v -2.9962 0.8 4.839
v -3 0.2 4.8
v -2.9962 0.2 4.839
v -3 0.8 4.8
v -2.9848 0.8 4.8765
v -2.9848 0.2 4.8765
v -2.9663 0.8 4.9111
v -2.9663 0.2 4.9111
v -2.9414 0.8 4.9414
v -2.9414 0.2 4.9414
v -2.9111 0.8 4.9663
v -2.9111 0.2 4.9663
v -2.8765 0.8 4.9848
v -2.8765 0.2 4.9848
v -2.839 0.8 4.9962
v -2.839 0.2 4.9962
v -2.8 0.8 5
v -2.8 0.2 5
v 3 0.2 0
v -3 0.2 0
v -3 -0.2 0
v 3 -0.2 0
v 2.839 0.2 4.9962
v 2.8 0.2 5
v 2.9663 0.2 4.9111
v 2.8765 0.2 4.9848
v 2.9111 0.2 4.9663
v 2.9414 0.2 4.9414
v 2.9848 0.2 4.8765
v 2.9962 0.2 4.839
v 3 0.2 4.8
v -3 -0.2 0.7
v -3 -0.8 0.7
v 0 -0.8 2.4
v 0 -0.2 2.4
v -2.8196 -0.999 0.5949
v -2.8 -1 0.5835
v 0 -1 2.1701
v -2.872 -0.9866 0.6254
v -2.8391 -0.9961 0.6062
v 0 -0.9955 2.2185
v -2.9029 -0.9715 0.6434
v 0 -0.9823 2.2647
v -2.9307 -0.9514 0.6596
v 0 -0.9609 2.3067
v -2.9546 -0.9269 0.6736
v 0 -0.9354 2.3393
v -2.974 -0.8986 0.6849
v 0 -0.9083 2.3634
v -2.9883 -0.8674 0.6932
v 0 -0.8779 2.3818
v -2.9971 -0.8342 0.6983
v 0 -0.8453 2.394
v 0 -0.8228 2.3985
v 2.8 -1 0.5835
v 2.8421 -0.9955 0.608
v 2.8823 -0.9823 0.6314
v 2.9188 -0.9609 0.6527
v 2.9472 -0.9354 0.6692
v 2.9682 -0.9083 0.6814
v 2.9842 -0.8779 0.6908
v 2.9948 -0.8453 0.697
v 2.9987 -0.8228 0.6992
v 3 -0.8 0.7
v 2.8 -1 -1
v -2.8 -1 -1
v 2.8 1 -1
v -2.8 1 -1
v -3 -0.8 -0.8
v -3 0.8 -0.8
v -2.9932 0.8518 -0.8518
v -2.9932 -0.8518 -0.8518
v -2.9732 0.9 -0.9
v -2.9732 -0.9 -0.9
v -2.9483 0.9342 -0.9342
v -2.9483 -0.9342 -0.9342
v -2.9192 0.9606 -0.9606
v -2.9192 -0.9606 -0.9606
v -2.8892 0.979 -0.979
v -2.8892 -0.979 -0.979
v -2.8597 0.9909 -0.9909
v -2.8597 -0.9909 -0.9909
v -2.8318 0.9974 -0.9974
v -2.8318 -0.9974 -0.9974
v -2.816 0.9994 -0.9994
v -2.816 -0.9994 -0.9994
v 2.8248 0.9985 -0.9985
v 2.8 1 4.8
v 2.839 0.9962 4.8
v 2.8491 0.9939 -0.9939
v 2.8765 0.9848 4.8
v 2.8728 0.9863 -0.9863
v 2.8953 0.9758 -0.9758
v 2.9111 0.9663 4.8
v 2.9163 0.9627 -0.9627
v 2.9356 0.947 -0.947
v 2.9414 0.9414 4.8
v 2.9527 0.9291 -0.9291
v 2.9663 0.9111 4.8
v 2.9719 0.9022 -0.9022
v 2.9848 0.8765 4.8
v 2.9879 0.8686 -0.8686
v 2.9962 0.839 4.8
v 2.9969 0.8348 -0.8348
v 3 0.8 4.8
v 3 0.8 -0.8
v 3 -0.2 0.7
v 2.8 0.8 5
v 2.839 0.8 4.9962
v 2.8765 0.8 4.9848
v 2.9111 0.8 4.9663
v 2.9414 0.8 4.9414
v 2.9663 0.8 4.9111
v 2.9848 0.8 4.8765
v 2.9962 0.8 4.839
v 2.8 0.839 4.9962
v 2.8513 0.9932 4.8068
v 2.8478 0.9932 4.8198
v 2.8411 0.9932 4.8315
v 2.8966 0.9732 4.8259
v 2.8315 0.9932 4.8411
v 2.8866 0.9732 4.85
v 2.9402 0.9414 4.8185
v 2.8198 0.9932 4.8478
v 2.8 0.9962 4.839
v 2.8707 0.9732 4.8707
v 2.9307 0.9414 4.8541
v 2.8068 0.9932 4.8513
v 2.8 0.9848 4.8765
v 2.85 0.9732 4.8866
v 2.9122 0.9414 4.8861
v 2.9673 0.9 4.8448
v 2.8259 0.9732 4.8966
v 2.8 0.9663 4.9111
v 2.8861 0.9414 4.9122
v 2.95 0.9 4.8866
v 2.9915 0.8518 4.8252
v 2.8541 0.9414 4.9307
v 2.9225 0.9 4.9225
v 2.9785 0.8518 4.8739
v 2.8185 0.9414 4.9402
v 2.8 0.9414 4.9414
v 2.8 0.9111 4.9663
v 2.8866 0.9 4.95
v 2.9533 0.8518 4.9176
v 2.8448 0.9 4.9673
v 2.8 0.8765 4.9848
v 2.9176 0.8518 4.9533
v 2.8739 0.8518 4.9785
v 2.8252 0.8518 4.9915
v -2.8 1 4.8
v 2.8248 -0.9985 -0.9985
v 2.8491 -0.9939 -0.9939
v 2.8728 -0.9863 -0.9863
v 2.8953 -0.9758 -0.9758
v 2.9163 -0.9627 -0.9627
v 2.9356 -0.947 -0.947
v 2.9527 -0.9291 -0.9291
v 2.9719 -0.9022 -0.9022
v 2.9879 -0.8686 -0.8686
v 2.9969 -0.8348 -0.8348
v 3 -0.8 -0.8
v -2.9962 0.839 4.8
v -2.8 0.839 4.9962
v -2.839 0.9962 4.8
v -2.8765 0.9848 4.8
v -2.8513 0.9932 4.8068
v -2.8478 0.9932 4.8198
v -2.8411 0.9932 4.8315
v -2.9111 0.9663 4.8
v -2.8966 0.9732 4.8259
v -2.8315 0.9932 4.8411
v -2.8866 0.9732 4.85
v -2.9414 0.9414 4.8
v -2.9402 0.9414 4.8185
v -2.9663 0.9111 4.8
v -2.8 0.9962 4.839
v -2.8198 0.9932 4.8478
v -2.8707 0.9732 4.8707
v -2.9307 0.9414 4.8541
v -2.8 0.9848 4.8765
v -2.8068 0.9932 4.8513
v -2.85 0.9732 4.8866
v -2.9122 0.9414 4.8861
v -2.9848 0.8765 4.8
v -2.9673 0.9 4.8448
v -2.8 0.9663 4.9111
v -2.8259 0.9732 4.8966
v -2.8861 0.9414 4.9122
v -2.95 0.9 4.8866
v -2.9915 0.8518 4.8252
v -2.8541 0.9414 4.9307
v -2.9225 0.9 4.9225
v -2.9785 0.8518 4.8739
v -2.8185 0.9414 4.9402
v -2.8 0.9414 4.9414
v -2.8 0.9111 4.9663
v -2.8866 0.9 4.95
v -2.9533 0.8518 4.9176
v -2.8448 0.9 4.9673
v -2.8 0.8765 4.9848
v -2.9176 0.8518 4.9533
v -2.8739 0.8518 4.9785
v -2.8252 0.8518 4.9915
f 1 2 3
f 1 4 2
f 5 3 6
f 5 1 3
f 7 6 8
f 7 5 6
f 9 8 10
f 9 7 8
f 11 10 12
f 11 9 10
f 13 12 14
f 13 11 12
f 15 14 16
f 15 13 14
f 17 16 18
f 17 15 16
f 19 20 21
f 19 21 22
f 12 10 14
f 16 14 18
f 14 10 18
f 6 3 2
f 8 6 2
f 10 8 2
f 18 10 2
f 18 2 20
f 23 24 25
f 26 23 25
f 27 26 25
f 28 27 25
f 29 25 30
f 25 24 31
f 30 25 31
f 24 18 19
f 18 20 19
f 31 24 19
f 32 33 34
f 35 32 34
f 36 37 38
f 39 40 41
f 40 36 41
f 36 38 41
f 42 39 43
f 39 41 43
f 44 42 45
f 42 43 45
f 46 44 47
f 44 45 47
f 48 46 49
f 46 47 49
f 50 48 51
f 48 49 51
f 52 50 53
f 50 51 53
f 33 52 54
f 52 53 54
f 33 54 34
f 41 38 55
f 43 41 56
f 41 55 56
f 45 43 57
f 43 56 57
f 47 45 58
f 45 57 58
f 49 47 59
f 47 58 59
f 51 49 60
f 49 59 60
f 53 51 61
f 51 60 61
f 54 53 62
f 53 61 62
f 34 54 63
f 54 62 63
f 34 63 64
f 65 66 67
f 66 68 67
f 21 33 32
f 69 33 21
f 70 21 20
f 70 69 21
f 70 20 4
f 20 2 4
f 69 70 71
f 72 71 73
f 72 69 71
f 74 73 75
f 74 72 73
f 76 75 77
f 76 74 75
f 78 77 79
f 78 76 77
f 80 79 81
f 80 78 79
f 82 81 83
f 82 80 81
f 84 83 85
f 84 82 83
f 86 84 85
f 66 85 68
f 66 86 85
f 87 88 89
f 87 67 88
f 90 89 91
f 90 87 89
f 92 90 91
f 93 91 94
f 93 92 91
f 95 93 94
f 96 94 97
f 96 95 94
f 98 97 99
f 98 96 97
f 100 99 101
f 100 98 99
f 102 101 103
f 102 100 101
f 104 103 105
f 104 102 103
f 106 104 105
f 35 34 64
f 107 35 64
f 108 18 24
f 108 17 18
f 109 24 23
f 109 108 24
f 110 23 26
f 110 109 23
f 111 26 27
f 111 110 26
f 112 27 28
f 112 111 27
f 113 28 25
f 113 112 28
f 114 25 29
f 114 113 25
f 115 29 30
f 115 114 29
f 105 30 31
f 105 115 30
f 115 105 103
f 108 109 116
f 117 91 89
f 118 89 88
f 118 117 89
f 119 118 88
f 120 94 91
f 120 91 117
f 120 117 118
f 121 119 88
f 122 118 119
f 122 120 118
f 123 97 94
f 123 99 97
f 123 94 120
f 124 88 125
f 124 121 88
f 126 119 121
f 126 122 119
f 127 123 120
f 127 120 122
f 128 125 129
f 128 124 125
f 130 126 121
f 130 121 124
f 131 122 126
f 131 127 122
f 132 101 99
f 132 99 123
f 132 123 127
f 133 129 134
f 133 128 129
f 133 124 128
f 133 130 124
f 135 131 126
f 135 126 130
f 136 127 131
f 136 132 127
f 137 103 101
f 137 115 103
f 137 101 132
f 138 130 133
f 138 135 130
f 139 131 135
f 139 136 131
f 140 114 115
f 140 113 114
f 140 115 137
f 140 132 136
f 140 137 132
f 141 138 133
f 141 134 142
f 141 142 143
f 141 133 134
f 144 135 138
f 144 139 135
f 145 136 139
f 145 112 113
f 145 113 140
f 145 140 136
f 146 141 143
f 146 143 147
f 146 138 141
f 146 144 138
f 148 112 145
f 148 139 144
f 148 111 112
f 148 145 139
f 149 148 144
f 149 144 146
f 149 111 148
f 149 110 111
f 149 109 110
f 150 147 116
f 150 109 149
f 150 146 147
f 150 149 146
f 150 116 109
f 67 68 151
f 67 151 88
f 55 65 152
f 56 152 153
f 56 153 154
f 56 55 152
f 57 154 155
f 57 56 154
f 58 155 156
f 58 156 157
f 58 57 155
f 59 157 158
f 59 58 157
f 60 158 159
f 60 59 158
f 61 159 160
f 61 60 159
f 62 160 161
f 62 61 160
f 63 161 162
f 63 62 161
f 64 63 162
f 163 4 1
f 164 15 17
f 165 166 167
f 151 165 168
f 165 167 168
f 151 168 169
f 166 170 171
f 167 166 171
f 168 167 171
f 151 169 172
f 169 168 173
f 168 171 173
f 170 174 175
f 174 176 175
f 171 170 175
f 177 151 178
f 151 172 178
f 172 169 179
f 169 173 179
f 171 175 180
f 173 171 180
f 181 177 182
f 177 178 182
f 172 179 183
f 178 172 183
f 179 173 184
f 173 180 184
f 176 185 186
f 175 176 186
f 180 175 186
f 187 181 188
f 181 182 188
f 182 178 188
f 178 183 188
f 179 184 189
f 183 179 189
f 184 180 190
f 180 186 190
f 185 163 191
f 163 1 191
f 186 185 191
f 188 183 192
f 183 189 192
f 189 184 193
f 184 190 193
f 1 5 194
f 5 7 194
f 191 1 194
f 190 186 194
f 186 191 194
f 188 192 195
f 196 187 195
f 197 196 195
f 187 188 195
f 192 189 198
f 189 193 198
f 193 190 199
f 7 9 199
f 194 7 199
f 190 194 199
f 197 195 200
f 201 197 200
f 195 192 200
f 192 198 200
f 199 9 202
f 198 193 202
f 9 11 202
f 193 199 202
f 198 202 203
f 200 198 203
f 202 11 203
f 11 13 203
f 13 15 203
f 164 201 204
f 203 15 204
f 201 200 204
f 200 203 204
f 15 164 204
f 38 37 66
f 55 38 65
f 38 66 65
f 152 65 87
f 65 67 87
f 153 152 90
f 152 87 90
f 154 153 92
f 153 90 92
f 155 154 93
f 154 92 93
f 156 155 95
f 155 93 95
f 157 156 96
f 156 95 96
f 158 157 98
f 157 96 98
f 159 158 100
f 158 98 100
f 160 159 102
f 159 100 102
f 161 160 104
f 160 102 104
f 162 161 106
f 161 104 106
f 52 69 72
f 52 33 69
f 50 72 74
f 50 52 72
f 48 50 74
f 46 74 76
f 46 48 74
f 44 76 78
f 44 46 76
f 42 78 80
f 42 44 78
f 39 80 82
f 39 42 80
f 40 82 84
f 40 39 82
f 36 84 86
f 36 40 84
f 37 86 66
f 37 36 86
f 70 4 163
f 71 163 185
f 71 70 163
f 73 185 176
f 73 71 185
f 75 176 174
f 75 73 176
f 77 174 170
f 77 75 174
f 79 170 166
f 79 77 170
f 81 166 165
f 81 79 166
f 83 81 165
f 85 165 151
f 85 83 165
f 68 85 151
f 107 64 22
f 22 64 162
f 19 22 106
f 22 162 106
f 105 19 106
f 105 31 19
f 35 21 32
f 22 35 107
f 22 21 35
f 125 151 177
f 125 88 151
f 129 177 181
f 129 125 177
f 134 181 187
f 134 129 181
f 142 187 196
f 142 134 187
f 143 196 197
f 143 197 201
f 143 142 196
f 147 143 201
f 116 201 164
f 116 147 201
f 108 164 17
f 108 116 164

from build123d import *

# Parameters (mm, degrees)
F0_W     = 6
F0_H     = 0.8
F0_H_2   = 0.4
F1_DEPTH = 1
F2_DEPTH = 5
F3_DEPTH = 2.4
F5_DEPTH = 1
F6_R     = 0.2


with BuildPart() as f1:
    # F0 (on Top) → F1 (new body)
    with BuildSketch(Plane.XY):
        with Locations((0, -0.6)):
            Rectangle(F0_W, F0_H)
        Rectangle(F0_W, F0_H_2)
        with Locations((0, 0.6)):
            Rectangle(F0_W, F0_H)
    extrude(amount=-F1_DEPTH)

    # F0 (on Top) → F2 (join)
    with BuildSketch(Plane.XY):
        with Locations((0, 0.6)):
            Rectangle(F0_W, F0_H)
    extrude(amount=F2_DEPTH)

    # F0 (on Top) → F3 (join)
    with BuildSketch(Plane.XY):
        with Locations((0, -0.6)):
            Rectangle(F0_W, F0_H)
    extrude(amount=F3_DEPTH)

    # F4 (on face) → F5 (cut)
    with BuildSketch(Plane.XZ.offset(1)):
        Polygon((-3, 2.4), (-3, 0.7), (0, 2.4), align=None)
        Polygon((3, 2.4), (0, 2.4), (3, 0.7), align=None)
    extrude(amount=-F5_DEPTH, mode=Mode.SUBTRACT)

    # F6
    f6_edges = [f1.edges().sort_by_distance(p)[0] for p in [
        (3, 0.6, 5),
        (-3, 0.6, 5),
        (3, 0, -1),
        (-3, 0, -1),
        (3, 1, 2),
        (-3, 1, 2),
        (3, -1, -0.15),
        (-3, -1, -0.15),
        (-1.5, -1, 1.55),
        (1.5, -1, 1.55),
        (0, 1, 5),
    ]]
    fillet(f6_edges, radius=F6_R)


solid = f1.part
